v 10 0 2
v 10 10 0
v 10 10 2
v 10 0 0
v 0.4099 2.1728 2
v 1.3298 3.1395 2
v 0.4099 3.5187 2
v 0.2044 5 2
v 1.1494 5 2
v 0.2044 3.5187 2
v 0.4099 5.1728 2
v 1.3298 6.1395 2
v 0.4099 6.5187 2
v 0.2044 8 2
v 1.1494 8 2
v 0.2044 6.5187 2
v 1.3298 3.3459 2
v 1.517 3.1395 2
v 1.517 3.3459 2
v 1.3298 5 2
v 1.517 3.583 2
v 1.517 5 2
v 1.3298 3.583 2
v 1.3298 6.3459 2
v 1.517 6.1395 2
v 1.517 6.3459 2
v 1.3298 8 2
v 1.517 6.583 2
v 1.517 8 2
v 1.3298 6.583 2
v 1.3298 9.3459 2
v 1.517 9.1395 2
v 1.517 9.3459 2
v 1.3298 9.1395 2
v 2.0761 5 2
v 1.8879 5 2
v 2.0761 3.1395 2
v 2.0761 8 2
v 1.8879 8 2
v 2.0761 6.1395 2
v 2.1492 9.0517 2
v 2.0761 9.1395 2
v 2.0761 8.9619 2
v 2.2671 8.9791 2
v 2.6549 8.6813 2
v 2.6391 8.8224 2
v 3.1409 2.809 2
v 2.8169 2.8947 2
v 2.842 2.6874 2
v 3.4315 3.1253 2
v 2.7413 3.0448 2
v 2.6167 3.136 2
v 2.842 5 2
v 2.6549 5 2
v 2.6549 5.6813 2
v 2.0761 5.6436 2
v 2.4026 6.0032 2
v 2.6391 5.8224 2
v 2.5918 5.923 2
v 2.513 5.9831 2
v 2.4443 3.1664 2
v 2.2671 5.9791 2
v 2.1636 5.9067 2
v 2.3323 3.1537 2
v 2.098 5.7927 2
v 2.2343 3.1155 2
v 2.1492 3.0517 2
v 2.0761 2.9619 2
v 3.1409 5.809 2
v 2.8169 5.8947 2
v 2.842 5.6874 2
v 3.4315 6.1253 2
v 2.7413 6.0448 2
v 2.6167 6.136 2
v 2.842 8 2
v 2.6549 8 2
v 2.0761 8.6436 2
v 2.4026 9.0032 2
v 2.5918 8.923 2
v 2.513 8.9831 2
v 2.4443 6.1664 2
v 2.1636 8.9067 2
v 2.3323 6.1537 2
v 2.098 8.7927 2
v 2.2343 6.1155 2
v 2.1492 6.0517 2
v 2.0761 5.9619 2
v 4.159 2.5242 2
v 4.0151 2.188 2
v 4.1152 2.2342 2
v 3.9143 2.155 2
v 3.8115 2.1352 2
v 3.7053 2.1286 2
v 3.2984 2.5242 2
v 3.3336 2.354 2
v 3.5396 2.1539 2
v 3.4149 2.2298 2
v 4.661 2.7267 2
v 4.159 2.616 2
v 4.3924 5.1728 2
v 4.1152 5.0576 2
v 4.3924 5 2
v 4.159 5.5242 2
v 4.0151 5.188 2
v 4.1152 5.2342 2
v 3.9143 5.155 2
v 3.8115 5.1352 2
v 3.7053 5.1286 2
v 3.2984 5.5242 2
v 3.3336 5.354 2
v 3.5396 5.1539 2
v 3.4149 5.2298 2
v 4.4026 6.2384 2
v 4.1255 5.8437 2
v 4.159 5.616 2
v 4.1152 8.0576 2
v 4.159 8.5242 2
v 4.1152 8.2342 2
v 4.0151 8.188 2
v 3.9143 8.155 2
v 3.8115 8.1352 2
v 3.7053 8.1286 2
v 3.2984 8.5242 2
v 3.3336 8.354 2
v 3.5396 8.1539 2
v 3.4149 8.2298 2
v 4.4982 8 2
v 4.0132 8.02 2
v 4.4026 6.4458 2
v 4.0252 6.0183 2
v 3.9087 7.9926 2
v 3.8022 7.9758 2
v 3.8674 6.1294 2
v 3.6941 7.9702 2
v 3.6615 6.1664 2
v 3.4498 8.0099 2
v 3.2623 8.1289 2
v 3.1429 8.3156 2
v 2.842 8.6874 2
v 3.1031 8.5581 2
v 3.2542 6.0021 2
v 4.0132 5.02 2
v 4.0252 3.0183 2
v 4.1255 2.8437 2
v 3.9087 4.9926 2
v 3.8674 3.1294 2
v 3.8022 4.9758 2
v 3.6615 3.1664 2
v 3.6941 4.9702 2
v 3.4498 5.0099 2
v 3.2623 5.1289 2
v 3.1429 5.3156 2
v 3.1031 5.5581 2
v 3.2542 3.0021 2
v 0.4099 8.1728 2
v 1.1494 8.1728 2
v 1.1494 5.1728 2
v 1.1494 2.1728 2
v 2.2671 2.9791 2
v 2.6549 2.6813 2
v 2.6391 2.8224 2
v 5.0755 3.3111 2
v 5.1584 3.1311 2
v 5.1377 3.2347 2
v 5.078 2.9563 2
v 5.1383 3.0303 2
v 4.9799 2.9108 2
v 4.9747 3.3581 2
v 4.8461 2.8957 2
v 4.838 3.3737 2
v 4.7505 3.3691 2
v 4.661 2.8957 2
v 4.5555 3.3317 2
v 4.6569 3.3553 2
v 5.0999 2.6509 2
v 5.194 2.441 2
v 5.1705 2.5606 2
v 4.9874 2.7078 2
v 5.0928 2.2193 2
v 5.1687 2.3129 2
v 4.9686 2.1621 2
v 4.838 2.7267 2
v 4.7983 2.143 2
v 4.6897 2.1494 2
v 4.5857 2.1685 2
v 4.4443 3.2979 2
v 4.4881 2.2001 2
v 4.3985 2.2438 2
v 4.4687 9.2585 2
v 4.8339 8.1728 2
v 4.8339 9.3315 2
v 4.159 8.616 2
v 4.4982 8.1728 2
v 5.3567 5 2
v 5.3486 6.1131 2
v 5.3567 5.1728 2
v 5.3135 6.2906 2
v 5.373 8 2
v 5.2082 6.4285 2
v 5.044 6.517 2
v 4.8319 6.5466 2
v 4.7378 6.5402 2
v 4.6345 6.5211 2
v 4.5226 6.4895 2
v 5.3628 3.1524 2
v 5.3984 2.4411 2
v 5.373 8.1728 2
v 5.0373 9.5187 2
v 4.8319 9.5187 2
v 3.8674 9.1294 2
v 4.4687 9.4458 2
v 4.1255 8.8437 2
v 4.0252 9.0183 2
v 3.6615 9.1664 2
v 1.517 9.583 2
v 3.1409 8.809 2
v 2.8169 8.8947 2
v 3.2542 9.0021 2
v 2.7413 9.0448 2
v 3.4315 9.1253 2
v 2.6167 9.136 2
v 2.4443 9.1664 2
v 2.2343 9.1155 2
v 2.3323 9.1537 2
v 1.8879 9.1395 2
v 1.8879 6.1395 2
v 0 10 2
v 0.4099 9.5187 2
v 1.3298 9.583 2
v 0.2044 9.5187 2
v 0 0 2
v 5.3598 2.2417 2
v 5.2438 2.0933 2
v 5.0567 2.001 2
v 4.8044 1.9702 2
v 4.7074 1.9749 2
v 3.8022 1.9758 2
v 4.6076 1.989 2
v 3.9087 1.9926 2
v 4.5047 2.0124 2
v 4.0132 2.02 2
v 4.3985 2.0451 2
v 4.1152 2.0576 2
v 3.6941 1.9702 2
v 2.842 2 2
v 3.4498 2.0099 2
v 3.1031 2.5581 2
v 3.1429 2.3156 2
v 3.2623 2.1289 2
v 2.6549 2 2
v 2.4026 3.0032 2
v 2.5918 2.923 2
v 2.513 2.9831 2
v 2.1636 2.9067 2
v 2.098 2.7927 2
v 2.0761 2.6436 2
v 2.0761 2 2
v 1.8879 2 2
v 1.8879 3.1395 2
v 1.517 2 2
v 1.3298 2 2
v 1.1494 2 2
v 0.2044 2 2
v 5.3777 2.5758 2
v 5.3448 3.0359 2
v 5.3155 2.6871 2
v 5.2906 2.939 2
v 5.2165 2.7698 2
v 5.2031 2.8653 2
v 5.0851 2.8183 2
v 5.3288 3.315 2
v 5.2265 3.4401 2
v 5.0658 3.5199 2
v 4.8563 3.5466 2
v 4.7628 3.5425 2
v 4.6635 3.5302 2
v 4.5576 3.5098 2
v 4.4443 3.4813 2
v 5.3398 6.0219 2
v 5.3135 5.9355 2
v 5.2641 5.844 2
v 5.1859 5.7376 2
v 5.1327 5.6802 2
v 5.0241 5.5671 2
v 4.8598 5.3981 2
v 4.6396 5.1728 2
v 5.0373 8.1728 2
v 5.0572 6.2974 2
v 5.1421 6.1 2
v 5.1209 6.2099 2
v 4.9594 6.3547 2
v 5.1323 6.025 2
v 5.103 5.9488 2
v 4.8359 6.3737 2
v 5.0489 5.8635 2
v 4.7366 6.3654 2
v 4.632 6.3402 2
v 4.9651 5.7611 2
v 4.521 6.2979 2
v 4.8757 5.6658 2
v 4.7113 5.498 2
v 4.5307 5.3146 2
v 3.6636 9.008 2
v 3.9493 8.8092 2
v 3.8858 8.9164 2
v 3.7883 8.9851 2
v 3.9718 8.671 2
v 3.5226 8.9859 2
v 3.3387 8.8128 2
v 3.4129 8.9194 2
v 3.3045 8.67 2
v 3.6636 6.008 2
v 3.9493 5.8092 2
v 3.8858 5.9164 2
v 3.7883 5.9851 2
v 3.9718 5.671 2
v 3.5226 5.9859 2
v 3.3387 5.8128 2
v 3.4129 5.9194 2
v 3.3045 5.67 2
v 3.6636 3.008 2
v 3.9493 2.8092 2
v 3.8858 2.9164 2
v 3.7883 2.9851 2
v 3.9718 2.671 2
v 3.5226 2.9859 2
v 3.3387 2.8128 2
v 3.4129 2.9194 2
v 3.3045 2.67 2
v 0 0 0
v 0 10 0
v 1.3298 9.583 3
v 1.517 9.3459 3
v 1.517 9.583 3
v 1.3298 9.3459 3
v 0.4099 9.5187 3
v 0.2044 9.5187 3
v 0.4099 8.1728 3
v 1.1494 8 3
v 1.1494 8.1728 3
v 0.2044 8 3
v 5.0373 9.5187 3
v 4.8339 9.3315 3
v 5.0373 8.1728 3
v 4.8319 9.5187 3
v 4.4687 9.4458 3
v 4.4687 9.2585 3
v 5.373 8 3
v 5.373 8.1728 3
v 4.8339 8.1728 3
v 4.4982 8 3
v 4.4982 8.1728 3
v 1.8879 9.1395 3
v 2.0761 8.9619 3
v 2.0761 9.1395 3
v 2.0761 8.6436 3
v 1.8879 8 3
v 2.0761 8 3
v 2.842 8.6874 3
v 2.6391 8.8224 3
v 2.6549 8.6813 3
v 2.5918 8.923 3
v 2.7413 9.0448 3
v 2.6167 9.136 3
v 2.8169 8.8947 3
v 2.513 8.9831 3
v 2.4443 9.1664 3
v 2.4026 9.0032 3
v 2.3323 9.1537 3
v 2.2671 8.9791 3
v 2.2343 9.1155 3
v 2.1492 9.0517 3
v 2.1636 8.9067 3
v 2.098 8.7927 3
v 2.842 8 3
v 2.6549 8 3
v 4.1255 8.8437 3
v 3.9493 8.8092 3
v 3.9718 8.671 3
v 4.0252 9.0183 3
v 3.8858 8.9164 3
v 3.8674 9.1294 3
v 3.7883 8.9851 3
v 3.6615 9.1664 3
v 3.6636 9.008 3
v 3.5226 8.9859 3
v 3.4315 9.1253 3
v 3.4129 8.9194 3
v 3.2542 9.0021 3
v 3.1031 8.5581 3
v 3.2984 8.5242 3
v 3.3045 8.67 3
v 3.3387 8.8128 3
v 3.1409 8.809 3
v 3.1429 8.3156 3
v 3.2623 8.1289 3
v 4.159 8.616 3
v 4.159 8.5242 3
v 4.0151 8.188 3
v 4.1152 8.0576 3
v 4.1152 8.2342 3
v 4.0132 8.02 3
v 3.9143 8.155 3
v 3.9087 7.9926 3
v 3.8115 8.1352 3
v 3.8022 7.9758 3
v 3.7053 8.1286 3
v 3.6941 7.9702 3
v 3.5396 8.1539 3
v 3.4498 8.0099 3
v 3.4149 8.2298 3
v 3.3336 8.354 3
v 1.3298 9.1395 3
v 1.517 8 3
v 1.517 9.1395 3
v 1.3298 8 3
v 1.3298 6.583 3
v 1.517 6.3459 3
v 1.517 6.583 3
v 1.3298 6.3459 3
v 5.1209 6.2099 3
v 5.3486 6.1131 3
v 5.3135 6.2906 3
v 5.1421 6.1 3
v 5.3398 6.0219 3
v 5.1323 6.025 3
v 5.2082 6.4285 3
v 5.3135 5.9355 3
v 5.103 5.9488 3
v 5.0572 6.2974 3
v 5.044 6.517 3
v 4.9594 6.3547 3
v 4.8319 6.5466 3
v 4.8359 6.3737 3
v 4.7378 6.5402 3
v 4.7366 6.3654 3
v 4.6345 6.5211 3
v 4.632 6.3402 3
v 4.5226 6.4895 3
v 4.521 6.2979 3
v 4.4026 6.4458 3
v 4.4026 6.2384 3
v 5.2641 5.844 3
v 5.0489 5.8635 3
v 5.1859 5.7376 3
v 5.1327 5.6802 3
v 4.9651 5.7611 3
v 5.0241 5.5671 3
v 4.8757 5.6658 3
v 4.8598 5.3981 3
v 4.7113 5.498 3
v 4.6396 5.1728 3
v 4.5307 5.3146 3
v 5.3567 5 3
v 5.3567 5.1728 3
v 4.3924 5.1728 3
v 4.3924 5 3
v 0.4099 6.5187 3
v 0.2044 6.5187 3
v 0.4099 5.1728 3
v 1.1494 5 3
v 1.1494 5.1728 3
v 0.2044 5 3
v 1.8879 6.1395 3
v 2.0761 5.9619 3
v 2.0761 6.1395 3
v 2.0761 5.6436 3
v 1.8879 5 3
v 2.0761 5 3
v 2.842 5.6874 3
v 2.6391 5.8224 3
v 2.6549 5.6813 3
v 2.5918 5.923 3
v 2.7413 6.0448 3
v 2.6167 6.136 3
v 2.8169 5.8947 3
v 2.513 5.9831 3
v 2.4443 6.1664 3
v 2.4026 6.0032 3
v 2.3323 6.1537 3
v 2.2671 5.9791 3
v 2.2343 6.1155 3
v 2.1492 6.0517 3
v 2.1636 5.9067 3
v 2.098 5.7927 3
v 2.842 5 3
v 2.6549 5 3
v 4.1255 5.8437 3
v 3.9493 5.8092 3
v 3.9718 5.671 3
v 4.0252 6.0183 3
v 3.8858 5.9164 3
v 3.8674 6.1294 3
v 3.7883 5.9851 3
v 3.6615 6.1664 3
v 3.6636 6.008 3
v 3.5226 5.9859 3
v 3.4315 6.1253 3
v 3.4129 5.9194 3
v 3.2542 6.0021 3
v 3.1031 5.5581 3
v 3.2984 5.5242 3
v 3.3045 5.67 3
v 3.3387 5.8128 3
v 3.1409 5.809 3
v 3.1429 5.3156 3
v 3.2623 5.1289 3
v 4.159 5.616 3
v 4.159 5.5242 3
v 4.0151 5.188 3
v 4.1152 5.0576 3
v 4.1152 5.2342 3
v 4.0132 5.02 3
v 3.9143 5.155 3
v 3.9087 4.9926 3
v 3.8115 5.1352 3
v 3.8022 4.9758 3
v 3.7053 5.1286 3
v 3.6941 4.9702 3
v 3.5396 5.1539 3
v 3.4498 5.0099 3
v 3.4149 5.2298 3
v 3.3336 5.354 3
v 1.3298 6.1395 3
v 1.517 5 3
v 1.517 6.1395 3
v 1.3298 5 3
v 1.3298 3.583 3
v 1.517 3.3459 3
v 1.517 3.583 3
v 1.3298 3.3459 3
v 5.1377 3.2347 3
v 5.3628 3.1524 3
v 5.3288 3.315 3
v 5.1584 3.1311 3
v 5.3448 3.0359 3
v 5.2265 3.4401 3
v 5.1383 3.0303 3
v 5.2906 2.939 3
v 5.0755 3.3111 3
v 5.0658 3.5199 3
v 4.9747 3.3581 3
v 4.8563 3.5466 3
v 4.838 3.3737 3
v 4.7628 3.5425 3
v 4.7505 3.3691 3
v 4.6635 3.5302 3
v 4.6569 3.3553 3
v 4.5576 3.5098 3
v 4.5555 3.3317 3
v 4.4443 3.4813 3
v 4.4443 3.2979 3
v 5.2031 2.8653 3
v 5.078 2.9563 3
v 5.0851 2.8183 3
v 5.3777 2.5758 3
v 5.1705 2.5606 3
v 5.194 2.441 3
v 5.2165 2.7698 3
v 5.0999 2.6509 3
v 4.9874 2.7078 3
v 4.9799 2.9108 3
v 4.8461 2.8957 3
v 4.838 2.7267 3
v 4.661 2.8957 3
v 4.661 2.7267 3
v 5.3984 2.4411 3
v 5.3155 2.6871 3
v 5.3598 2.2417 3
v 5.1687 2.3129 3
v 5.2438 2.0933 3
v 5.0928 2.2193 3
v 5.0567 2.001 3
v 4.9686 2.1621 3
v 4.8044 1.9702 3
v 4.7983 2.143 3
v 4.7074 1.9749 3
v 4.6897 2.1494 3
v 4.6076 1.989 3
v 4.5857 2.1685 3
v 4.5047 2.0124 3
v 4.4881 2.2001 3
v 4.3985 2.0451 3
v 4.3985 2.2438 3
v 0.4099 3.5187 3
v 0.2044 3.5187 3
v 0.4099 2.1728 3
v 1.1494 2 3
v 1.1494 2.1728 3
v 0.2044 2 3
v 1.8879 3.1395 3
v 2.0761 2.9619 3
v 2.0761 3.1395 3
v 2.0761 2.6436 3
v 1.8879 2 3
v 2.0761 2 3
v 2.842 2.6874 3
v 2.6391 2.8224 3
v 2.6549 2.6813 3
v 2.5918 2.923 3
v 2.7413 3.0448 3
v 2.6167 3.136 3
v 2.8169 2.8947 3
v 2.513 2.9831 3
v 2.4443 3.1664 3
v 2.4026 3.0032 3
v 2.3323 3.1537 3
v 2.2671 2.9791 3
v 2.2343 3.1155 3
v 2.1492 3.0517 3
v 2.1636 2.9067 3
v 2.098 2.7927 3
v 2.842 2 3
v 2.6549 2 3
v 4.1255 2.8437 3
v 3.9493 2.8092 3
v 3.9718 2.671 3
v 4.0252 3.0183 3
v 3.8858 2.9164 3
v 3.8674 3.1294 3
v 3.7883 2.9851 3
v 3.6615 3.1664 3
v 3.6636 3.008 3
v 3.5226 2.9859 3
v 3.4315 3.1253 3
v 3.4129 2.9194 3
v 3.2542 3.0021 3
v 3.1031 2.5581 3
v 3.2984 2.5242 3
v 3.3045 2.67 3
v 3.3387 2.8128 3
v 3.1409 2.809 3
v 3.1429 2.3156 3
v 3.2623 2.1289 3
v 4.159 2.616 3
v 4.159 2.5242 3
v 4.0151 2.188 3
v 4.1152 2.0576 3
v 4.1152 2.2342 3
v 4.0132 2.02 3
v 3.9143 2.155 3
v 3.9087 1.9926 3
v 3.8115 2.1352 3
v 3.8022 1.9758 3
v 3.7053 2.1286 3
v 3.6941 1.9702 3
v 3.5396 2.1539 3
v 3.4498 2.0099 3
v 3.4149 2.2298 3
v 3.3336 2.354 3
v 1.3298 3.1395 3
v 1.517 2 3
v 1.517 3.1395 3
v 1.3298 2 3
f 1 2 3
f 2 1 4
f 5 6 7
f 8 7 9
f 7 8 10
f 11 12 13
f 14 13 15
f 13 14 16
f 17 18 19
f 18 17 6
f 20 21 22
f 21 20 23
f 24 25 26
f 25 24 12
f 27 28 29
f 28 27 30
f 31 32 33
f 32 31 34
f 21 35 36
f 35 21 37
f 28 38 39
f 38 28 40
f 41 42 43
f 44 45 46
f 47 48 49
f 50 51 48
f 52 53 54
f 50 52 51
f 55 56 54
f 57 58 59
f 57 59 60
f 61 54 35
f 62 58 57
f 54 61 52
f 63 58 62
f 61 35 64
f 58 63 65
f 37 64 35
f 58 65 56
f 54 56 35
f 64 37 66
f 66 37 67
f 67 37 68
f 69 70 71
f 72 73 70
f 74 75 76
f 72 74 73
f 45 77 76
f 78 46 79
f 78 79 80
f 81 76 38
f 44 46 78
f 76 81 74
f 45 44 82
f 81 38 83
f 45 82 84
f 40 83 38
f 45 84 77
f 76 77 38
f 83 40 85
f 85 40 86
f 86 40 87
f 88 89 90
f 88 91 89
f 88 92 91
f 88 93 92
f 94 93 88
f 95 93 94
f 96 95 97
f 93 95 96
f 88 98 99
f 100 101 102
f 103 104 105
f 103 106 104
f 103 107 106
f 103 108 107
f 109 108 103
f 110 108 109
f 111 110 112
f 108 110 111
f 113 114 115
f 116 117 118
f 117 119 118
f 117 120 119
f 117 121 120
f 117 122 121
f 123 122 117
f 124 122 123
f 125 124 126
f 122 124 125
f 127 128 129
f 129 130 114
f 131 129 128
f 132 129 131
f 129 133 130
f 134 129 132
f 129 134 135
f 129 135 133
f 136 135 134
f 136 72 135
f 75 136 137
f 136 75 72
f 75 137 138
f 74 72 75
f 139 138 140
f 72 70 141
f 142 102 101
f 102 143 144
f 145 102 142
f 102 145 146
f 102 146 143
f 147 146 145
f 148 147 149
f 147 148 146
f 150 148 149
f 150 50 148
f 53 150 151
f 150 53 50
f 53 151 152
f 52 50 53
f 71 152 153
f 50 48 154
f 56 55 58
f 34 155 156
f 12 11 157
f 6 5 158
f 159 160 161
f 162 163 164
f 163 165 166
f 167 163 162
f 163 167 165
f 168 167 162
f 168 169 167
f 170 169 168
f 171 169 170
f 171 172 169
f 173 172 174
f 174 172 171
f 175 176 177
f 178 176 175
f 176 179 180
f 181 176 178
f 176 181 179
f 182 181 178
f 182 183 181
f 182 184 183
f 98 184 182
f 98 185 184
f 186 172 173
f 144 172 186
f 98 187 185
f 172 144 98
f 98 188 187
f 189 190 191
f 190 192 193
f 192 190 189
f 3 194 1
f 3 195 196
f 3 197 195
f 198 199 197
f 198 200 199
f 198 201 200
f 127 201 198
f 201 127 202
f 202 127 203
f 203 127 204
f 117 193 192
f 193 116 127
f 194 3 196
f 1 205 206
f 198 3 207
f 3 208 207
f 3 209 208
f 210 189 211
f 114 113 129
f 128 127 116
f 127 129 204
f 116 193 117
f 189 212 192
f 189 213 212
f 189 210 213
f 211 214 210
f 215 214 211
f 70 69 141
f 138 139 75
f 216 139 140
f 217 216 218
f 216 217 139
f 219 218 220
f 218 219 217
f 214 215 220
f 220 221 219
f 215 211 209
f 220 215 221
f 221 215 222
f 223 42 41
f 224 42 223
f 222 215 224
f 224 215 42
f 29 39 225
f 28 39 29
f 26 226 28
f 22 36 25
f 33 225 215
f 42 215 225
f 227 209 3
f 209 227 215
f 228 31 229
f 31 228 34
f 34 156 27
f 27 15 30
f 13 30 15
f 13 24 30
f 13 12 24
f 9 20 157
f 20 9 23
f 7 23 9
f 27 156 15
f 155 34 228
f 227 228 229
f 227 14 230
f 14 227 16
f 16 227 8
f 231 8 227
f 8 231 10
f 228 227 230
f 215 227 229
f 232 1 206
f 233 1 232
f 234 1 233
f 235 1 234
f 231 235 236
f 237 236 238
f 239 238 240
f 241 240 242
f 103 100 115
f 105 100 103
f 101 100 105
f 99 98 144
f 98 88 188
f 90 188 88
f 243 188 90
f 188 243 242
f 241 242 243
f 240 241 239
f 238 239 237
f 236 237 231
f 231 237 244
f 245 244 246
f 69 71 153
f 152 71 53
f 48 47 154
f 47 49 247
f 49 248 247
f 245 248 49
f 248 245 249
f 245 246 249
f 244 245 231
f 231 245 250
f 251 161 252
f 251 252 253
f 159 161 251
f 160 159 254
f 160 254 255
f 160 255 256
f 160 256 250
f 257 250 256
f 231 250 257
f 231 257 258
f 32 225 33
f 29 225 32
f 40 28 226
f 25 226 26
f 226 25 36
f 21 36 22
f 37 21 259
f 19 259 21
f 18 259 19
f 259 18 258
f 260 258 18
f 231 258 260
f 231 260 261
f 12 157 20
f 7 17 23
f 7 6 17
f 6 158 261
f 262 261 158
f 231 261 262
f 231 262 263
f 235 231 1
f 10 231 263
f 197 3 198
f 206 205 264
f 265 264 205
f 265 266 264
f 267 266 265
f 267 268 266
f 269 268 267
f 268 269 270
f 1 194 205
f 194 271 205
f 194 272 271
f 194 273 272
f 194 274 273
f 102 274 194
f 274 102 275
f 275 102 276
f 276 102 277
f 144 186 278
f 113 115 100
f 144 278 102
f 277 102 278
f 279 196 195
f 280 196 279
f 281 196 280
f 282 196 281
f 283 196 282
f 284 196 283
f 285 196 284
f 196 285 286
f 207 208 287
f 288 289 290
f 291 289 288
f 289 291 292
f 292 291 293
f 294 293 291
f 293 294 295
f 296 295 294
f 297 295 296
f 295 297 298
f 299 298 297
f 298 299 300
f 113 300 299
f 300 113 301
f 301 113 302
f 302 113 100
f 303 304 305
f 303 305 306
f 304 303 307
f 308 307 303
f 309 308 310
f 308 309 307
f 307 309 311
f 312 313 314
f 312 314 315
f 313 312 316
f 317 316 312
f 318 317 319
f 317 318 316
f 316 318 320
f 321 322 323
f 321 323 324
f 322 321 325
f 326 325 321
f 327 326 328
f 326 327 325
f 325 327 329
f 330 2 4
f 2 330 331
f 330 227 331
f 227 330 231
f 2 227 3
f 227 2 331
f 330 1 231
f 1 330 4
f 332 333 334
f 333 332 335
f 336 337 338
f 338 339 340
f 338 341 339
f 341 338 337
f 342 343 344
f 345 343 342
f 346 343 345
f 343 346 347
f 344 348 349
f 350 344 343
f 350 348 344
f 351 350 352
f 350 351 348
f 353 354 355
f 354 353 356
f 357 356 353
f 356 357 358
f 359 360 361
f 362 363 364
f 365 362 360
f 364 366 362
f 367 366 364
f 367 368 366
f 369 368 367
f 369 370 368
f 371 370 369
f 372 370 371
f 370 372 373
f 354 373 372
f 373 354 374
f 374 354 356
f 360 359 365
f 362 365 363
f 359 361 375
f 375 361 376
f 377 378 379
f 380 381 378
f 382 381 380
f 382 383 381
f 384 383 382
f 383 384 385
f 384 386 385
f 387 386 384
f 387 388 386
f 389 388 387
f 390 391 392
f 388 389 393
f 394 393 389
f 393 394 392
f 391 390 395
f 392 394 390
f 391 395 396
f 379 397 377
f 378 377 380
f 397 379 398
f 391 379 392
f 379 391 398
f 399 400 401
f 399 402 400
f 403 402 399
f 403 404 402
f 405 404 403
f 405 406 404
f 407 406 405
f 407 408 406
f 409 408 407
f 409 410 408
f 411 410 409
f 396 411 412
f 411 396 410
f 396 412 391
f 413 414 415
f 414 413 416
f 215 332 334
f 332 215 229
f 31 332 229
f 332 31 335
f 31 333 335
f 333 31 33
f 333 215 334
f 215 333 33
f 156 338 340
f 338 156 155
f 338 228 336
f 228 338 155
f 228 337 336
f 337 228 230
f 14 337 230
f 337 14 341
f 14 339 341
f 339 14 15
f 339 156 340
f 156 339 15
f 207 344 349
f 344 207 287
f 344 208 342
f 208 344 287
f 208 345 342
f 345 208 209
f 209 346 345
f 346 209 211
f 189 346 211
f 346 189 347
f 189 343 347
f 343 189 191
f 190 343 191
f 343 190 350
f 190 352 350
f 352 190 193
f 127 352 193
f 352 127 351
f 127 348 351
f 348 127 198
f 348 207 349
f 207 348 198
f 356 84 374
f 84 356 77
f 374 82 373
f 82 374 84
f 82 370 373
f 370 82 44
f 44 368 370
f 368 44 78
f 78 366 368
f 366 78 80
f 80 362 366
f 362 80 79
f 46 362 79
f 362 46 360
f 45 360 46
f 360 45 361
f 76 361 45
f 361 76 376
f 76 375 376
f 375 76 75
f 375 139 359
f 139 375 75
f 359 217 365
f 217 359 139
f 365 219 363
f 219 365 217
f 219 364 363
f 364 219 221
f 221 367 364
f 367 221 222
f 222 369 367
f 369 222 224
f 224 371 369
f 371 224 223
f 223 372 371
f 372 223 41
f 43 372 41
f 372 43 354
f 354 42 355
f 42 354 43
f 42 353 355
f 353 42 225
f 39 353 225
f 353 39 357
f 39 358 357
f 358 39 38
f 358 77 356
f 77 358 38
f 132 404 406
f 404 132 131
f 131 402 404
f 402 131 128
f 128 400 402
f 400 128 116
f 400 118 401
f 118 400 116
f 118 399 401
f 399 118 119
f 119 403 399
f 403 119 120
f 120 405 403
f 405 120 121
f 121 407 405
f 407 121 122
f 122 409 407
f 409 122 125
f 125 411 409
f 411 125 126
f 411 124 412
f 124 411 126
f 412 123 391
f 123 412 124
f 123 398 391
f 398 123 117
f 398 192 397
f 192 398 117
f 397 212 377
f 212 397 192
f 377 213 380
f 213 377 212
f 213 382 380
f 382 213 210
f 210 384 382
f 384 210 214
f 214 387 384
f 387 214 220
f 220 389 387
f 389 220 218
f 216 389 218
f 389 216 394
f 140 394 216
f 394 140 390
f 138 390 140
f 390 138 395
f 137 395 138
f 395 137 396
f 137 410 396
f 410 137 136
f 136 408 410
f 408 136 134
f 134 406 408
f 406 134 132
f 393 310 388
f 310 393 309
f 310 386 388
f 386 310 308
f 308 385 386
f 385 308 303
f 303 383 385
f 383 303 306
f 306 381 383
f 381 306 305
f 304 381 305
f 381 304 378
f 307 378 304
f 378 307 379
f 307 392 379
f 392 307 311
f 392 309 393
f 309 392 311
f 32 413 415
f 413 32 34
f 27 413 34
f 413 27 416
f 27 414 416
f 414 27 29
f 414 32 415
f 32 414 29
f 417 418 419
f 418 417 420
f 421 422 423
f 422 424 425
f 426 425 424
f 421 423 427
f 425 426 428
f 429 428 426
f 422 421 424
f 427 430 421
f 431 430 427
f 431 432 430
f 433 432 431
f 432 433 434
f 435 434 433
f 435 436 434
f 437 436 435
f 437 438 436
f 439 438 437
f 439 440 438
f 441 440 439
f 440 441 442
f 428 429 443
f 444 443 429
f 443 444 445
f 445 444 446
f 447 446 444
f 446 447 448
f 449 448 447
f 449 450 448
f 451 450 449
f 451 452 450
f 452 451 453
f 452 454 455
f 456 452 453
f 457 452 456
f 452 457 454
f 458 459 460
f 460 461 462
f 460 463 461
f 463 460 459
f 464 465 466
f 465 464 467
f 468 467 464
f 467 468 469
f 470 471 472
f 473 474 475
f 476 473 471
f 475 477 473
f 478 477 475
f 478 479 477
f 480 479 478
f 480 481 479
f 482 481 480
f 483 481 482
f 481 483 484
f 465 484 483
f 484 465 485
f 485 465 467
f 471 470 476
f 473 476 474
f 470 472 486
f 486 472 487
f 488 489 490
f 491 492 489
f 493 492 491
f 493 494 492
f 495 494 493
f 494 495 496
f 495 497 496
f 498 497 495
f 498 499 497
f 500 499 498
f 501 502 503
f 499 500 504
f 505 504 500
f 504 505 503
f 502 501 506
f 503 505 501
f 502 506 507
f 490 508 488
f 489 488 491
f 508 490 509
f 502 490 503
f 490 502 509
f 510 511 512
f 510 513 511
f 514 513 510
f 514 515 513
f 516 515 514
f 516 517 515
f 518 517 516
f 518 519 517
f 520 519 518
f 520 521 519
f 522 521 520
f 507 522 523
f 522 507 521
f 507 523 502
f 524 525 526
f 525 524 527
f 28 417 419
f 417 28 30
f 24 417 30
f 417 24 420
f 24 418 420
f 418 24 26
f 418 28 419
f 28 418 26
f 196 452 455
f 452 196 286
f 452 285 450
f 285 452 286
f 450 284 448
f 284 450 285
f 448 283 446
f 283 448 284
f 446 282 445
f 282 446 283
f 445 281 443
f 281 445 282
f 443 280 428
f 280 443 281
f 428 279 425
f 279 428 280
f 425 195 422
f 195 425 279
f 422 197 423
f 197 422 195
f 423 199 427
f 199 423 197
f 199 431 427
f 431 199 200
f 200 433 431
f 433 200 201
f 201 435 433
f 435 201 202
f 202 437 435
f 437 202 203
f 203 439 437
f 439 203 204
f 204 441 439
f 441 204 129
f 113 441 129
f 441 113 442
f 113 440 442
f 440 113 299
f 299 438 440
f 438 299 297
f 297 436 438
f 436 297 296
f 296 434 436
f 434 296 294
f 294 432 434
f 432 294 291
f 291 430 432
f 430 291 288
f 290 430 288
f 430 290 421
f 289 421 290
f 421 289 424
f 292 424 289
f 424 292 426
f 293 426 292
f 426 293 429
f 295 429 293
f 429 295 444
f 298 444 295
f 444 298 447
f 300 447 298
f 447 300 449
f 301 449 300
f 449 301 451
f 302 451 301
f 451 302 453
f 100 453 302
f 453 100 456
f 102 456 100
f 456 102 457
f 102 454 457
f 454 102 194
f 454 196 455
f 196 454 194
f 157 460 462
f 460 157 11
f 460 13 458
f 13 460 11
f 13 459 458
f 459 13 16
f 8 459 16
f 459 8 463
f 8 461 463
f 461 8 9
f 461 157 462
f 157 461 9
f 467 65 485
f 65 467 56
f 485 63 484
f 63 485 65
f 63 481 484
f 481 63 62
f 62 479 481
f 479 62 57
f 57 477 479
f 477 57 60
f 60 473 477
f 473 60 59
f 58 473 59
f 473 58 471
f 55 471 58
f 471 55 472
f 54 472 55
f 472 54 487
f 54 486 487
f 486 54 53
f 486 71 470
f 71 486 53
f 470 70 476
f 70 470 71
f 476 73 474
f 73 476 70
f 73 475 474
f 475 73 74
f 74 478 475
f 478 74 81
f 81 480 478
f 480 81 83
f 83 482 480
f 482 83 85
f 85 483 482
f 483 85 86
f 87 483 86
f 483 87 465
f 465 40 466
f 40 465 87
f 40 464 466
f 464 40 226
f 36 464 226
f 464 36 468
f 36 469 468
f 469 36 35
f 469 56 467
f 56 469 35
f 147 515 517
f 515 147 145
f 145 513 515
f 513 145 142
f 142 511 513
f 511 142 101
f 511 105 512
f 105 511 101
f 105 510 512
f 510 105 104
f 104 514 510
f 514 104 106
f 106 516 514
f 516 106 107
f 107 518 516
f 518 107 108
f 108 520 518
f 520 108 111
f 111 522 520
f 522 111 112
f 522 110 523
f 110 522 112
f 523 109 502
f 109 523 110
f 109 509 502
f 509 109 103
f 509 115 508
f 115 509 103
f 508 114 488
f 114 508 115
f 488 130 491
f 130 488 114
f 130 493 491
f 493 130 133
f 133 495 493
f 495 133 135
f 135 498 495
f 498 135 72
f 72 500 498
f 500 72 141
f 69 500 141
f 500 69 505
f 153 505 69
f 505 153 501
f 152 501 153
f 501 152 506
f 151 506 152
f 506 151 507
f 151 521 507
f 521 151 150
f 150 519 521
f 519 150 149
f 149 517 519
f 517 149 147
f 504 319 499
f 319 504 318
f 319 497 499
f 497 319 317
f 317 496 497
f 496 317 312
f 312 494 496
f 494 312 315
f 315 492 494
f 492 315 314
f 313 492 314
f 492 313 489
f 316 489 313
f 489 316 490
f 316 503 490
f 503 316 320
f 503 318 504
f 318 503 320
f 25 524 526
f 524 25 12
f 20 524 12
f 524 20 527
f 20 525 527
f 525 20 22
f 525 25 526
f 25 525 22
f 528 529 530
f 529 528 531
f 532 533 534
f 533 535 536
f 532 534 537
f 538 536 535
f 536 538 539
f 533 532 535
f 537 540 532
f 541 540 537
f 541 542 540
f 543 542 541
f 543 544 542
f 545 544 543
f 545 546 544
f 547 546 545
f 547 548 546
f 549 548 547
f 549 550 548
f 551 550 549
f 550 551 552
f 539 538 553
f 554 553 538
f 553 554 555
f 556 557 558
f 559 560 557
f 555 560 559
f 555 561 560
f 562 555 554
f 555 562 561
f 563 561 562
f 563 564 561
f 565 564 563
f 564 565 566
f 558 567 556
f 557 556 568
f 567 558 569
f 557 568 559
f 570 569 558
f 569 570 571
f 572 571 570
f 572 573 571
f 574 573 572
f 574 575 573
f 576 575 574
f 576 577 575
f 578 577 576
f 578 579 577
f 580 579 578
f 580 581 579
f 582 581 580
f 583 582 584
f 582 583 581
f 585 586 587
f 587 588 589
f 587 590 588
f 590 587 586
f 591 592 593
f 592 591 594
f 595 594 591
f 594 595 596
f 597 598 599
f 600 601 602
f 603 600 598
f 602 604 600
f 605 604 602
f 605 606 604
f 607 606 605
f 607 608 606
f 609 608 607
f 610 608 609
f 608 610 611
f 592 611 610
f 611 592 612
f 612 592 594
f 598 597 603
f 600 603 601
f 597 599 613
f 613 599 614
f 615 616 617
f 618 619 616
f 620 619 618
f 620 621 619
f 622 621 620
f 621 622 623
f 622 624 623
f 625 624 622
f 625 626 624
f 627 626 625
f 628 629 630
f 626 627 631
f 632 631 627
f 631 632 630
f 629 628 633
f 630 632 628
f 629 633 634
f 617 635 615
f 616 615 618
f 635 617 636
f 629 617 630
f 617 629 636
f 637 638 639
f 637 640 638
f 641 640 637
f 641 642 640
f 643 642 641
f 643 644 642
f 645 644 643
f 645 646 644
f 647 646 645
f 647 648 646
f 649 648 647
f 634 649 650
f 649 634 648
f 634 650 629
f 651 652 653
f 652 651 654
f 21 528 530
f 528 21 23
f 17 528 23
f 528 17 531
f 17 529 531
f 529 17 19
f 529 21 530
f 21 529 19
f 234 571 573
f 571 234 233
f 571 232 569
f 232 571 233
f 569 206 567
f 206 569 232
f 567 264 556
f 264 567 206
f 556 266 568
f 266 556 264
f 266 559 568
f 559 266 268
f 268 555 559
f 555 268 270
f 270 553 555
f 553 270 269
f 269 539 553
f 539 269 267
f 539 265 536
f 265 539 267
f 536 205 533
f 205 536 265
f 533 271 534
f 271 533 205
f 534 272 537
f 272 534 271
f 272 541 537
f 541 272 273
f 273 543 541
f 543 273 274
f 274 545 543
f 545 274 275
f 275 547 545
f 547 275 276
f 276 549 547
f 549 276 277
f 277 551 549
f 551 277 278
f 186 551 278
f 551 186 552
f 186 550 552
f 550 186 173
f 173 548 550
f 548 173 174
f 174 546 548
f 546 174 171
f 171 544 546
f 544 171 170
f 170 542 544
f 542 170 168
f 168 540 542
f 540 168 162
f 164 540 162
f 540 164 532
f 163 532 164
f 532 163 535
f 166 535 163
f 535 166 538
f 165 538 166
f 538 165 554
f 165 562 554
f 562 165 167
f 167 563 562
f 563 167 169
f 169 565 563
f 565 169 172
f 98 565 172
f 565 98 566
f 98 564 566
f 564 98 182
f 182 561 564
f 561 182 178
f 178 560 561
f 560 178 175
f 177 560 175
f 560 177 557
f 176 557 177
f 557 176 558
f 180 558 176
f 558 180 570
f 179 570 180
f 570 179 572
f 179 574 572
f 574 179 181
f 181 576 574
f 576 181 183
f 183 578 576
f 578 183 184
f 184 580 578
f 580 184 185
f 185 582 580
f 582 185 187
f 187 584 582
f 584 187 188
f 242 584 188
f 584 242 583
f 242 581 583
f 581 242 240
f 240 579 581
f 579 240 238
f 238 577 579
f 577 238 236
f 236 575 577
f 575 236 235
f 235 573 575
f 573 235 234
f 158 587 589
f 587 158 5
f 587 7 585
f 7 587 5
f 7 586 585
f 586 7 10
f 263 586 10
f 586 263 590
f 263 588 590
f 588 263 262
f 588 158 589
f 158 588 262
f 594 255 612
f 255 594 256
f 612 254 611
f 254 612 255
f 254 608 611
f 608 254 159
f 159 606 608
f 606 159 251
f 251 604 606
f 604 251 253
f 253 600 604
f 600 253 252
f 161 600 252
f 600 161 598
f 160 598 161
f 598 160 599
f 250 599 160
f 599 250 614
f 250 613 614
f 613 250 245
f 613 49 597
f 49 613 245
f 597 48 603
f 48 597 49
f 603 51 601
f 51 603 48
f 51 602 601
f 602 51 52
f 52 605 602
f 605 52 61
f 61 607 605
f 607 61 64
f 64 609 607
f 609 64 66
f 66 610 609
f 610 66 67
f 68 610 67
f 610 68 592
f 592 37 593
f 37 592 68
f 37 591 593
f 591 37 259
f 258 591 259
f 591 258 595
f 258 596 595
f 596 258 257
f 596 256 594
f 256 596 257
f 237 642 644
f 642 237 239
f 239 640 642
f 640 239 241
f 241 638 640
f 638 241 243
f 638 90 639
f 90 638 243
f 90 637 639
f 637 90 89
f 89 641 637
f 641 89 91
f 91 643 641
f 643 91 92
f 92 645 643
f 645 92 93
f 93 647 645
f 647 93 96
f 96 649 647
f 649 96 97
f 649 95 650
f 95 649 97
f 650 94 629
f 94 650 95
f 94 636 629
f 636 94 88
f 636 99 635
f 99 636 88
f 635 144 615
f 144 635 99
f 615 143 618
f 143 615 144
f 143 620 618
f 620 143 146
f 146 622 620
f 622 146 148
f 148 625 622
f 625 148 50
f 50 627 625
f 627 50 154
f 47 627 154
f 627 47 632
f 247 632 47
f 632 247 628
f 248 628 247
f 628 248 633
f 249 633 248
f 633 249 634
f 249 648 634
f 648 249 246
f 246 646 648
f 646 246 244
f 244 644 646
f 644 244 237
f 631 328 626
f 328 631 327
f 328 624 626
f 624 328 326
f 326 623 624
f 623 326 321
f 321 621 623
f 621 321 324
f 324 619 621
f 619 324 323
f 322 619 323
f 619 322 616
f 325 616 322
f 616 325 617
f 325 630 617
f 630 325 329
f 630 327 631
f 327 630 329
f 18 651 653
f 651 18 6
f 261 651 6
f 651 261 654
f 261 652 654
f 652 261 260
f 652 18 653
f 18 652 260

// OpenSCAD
cube([10, 10, 2]);
translate([-0,8,0])linear_extrude(height=3)
text("Line1", size = 1.5, h=5, font = "Comic Sans MS");
translate([-0,5,0])linear_extrude(height=3)
text("Line2", size = 1.5, h=5, font = "Comic Sans MS");
translate([-0,2,0])linear_extrude(height=3)
text("Line3", size = 1.5, h=5, font = "Comic Sans MS");
        
